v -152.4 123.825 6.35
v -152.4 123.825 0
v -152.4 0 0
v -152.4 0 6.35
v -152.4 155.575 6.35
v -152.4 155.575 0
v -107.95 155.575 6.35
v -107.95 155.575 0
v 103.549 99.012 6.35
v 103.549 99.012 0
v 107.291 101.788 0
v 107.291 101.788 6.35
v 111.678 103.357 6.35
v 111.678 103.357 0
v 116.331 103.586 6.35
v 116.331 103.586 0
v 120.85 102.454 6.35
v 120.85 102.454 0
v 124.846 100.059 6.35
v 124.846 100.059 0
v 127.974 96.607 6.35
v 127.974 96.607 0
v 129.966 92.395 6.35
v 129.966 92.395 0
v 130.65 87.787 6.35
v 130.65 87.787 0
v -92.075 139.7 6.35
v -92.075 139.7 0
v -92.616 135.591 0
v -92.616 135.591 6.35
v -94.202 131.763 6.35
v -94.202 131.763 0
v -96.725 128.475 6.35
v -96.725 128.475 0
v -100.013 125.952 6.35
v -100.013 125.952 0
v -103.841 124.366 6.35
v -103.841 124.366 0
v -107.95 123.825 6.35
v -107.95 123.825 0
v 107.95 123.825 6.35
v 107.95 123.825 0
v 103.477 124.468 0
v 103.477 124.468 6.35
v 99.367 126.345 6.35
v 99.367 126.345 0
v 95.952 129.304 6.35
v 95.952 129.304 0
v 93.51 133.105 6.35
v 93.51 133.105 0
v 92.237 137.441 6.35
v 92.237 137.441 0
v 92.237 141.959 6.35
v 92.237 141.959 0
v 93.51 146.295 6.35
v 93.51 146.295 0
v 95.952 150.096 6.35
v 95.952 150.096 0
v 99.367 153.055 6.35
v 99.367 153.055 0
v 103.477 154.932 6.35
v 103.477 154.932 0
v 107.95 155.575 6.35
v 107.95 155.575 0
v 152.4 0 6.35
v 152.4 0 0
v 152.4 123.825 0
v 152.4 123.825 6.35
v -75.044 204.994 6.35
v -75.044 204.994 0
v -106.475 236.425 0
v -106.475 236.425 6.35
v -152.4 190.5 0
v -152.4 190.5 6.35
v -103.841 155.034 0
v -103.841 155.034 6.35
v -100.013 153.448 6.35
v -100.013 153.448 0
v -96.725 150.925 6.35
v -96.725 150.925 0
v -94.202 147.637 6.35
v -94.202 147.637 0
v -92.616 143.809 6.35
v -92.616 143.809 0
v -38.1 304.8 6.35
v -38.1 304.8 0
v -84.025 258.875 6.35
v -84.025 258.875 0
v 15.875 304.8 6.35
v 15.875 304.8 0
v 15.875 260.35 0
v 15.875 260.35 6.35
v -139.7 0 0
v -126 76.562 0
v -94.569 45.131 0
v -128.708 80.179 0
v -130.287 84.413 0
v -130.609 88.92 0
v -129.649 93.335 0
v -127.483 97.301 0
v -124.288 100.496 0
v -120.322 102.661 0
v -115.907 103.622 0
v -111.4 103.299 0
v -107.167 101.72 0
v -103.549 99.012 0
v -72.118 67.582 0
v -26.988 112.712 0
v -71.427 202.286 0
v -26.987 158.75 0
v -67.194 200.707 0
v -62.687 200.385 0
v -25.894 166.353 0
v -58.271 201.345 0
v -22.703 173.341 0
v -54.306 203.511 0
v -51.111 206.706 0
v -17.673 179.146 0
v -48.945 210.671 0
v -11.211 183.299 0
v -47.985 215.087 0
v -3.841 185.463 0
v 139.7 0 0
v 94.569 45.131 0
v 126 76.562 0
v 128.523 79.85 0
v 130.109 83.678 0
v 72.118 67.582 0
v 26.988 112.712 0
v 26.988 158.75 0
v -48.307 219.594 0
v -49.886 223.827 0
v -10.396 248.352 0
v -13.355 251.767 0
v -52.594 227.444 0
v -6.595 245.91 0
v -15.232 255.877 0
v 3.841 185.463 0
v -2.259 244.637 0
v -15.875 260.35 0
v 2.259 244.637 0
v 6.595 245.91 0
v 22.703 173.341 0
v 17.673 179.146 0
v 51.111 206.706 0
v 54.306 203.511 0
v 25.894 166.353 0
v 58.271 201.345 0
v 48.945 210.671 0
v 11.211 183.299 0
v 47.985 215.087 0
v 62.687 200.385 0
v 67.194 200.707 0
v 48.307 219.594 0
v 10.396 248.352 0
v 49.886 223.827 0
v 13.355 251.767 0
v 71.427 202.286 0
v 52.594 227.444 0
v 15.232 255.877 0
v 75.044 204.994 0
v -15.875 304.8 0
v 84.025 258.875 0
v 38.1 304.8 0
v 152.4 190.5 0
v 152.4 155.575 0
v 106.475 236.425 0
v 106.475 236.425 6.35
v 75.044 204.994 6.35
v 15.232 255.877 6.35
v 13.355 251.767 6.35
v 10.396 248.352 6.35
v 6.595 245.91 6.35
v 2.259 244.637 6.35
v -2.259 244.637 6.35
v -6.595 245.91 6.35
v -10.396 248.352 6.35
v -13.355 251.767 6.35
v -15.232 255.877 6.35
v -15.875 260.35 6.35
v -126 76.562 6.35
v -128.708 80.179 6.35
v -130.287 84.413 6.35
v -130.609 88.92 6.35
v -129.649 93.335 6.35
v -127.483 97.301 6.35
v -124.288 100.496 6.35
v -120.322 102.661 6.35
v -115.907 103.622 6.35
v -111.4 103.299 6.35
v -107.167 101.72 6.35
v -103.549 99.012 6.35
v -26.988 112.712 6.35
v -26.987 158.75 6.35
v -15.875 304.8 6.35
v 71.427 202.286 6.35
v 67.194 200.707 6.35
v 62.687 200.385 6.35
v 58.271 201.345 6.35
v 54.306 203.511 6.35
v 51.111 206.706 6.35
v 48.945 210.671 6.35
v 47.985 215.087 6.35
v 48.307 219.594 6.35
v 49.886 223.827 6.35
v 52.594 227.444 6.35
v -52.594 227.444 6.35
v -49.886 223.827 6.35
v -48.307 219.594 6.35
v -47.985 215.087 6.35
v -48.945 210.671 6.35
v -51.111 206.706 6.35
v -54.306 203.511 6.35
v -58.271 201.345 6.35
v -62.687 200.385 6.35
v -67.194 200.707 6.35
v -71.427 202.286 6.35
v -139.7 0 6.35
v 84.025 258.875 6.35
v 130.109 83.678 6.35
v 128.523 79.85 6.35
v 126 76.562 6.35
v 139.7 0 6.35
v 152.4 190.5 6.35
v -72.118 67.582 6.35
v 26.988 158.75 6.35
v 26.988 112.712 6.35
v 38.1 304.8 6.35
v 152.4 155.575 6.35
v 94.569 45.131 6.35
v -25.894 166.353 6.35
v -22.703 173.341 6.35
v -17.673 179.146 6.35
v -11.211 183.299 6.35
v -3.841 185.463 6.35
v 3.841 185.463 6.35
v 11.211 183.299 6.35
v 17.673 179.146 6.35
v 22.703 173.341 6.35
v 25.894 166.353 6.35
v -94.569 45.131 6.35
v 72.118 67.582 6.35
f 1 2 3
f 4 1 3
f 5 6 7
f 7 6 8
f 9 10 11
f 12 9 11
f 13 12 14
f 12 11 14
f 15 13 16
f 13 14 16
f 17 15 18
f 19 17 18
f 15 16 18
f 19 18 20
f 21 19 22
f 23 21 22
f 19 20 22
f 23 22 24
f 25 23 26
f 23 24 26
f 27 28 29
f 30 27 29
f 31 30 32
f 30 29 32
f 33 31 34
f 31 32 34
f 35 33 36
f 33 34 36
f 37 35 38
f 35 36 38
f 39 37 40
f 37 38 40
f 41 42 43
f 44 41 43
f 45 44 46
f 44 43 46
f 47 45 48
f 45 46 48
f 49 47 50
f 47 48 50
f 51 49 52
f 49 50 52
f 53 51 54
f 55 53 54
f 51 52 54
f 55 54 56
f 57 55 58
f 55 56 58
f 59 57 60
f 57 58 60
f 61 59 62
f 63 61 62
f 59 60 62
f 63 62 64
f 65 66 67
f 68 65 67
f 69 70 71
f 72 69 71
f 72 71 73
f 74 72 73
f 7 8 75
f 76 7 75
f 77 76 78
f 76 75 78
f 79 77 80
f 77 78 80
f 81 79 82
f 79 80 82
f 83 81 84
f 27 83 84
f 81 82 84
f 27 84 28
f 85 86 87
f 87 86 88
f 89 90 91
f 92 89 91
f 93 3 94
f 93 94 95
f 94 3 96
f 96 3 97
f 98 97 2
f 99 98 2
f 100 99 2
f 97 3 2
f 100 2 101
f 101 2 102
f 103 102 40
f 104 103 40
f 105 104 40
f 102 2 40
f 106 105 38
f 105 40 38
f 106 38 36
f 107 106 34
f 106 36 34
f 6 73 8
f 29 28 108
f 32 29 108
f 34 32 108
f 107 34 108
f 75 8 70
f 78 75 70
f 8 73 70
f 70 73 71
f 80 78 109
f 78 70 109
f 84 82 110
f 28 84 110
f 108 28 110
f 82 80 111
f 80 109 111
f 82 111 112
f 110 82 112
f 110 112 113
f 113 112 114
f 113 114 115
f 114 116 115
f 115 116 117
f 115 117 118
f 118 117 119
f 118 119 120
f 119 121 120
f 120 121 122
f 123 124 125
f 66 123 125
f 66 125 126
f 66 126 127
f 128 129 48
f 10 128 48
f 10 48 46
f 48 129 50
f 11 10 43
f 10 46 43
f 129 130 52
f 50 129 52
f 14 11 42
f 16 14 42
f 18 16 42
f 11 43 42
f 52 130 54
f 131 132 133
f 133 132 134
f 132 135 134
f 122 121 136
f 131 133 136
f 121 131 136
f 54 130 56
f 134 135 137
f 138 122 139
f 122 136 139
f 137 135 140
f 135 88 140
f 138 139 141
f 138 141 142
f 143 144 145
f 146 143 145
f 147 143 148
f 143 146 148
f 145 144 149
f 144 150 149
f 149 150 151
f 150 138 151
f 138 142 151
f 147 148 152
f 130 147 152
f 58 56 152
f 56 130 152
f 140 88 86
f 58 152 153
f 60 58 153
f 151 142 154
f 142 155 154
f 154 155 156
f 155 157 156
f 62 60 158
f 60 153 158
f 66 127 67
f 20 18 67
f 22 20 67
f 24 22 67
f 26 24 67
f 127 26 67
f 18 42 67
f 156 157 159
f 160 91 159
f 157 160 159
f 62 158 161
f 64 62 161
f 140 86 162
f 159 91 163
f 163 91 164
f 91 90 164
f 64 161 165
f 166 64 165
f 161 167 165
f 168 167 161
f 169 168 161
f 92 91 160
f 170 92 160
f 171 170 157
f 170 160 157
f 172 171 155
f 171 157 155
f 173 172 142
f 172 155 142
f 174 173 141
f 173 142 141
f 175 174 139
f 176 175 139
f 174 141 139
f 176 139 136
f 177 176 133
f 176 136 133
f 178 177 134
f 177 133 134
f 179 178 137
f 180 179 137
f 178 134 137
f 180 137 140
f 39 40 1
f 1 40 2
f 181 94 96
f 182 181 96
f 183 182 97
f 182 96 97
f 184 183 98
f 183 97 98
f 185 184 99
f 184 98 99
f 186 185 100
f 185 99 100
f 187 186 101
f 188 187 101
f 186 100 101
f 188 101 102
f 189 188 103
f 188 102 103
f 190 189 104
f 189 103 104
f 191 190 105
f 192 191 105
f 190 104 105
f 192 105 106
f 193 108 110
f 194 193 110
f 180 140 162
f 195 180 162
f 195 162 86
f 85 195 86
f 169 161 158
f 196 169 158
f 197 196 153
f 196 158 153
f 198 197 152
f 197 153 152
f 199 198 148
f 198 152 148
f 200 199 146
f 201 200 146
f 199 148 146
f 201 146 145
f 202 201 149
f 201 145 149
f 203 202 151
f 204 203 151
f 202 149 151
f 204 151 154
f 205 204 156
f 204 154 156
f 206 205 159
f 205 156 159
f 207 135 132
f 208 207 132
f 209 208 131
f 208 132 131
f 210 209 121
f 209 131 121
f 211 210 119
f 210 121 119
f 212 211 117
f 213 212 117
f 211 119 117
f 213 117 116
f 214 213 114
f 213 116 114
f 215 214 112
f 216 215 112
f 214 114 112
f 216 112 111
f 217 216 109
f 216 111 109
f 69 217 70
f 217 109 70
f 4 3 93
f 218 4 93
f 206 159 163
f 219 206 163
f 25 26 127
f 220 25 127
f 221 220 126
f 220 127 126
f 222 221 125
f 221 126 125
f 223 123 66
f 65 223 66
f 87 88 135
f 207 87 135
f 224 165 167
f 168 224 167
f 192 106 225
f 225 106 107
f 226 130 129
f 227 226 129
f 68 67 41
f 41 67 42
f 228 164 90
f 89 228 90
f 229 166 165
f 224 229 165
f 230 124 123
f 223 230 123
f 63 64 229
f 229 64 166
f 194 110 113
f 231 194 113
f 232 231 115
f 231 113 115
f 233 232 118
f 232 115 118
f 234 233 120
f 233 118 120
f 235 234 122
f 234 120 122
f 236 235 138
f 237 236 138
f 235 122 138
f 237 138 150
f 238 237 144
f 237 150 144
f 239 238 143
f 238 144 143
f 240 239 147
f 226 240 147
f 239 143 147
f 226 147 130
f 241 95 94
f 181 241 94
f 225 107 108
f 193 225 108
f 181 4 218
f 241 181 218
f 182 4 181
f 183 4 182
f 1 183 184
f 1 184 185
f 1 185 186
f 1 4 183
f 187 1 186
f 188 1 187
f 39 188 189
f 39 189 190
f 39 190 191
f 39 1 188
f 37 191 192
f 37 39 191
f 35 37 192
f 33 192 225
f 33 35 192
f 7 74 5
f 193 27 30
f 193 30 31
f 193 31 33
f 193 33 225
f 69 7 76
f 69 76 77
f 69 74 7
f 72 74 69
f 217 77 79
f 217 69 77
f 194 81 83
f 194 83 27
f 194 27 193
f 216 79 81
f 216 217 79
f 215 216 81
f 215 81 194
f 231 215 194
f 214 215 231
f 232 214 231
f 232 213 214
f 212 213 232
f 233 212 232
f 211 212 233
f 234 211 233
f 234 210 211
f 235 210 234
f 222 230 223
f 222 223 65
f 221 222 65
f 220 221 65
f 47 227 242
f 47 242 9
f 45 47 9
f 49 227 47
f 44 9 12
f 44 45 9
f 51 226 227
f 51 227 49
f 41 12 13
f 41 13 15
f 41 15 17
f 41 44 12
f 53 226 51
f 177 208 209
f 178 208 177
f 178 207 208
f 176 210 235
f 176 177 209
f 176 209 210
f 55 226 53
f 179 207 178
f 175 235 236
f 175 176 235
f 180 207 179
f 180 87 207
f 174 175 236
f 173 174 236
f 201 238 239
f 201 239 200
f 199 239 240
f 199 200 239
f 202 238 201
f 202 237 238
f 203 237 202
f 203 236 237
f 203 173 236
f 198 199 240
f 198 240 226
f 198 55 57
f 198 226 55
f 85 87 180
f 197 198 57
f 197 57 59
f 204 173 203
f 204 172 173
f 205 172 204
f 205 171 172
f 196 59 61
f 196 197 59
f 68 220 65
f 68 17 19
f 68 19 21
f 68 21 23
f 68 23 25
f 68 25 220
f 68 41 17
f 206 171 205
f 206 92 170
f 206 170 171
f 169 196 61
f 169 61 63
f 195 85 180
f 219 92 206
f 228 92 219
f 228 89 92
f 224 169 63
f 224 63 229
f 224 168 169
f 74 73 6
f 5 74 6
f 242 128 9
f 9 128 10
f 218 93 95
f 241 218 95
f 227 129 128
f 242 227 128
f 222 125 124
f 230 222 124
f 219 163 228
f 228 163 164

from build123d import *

# Parameters (mm, degrees)
F1_DEPTH = 6.35


with BuildPart() as f1:
    # F0 (on Top) → F1 (new body)
    with BuildSketch(Plane.XY):
        with BuildLine():
            Line((-152.4, 123.825), (-152.4, 0))
            Line((-152.4, 0), (-139.7, 0))
            Line((-139.7, 0), (-94.56907, 45.13093))
            Line((-94.56907, 45.13093), (-125.999967, 76.561826))
            ThreePointArc((-125.999967, 76.561826), (-125.999967, 99.012467), (-103.549326, 99.012467))
            Line((-103.549326, 99.012467), (-72.11843, 67.58157))
            Line((-72.11843, 67.58157), (-26.9875, 112.7125))
            Line((-26.9875, 112.7125), (-26.9875, 158.75))
            ThreePointArc((-26.9875, 158.75), (0, 185.7375), (26.9875, 158.75))
            Line((26.9875, 158.75), (26.9875, 112.7125))
            Line((26.9875, 112.7125), (72.11843, 67.58157))
            Line((72.11843, 67.58157), (103.549326, 99.012467))
            ThreePointArc((103.549326, 99.012467), (120.849746, 102.453734), (130.649646, 87.787146))
            ThreePointArc((130.649646, 87.787146), (129.441234, 81.712047), (125.999967, 76.561826))
            Line((125.999967, 76.561826), (94.56907, 45.13093))
            Line((94.56907, 45.13093), (139.7, 0))
            Line((139.7, 0), (152.4, 0))
            Line((152.4, 0), (152.4, 123.825))
            Line((152.4, 123.825), (107.95, 123.825))
            ThreePointArc((107.95, 123.825), (92.075, 139.7), (107.95, 155.575))
            Line((107.95, 155.575), (152.4, 155.575))
            Line((152.4, 155.575), (152.4, 190.5))
            Line((152.4, 190.5), (106.47532, 236.42468))
            Line((106.47532, 236.42468), (75.044424, 204.993783))
            ThreePointArc((75.044424, 204.993783), (52.593783, 204.993783), (52.593783, 227.444424))
            Line((52.593783, 227.444424), (84.02468, 258.87532))
            Line((84.02468, 258.87532), (38.1, 304.8))
            Line((38.1, 304.8), (15.875, 304.8))
            Line((15.875, 304.8), (15.875, 260.35))
            ThreePointArc((15.875, 260.35), (0, 244.475), (-15.875, 260.35))
            Line((-15.875, 260.35), (-15.875, 304.8))
            Line((-15.875, 304.8), (-38.1, 304.8))
            Line((-38.1, 304.8), (-84.02468, 258.87532))
            Line((-84.02468, 258.87532), (-52.593783, 227.444424))
            ThreePointArc((-52.593783, 227.444424), (-52.593783, 204.993783), (-75.044424, 204.993783))
            Line((-75.044424, 204.993783), (-106.47532, 236.42468))
            Line((-106.47532, 236.42468), (-152.4, 190.5))
            Line((-152.4, 190.5), (-152.4, 155.575))
            Line((-152.4, 155.575), (-107.95, 155.575))
            ThreePointArc((-107.95, 155.575), (-96.72468, 150.92532), (-92.075, 139.7))
            ThreePointArc((-92.075, 139.7), (-96.72468, 128.47468), (-107.95, 123.825))
            Line((-107.95, 123.825), (-152.4, 123.825))
        make_face()
    extrude(amount=F1_DEPTH)


solid = f1.part
